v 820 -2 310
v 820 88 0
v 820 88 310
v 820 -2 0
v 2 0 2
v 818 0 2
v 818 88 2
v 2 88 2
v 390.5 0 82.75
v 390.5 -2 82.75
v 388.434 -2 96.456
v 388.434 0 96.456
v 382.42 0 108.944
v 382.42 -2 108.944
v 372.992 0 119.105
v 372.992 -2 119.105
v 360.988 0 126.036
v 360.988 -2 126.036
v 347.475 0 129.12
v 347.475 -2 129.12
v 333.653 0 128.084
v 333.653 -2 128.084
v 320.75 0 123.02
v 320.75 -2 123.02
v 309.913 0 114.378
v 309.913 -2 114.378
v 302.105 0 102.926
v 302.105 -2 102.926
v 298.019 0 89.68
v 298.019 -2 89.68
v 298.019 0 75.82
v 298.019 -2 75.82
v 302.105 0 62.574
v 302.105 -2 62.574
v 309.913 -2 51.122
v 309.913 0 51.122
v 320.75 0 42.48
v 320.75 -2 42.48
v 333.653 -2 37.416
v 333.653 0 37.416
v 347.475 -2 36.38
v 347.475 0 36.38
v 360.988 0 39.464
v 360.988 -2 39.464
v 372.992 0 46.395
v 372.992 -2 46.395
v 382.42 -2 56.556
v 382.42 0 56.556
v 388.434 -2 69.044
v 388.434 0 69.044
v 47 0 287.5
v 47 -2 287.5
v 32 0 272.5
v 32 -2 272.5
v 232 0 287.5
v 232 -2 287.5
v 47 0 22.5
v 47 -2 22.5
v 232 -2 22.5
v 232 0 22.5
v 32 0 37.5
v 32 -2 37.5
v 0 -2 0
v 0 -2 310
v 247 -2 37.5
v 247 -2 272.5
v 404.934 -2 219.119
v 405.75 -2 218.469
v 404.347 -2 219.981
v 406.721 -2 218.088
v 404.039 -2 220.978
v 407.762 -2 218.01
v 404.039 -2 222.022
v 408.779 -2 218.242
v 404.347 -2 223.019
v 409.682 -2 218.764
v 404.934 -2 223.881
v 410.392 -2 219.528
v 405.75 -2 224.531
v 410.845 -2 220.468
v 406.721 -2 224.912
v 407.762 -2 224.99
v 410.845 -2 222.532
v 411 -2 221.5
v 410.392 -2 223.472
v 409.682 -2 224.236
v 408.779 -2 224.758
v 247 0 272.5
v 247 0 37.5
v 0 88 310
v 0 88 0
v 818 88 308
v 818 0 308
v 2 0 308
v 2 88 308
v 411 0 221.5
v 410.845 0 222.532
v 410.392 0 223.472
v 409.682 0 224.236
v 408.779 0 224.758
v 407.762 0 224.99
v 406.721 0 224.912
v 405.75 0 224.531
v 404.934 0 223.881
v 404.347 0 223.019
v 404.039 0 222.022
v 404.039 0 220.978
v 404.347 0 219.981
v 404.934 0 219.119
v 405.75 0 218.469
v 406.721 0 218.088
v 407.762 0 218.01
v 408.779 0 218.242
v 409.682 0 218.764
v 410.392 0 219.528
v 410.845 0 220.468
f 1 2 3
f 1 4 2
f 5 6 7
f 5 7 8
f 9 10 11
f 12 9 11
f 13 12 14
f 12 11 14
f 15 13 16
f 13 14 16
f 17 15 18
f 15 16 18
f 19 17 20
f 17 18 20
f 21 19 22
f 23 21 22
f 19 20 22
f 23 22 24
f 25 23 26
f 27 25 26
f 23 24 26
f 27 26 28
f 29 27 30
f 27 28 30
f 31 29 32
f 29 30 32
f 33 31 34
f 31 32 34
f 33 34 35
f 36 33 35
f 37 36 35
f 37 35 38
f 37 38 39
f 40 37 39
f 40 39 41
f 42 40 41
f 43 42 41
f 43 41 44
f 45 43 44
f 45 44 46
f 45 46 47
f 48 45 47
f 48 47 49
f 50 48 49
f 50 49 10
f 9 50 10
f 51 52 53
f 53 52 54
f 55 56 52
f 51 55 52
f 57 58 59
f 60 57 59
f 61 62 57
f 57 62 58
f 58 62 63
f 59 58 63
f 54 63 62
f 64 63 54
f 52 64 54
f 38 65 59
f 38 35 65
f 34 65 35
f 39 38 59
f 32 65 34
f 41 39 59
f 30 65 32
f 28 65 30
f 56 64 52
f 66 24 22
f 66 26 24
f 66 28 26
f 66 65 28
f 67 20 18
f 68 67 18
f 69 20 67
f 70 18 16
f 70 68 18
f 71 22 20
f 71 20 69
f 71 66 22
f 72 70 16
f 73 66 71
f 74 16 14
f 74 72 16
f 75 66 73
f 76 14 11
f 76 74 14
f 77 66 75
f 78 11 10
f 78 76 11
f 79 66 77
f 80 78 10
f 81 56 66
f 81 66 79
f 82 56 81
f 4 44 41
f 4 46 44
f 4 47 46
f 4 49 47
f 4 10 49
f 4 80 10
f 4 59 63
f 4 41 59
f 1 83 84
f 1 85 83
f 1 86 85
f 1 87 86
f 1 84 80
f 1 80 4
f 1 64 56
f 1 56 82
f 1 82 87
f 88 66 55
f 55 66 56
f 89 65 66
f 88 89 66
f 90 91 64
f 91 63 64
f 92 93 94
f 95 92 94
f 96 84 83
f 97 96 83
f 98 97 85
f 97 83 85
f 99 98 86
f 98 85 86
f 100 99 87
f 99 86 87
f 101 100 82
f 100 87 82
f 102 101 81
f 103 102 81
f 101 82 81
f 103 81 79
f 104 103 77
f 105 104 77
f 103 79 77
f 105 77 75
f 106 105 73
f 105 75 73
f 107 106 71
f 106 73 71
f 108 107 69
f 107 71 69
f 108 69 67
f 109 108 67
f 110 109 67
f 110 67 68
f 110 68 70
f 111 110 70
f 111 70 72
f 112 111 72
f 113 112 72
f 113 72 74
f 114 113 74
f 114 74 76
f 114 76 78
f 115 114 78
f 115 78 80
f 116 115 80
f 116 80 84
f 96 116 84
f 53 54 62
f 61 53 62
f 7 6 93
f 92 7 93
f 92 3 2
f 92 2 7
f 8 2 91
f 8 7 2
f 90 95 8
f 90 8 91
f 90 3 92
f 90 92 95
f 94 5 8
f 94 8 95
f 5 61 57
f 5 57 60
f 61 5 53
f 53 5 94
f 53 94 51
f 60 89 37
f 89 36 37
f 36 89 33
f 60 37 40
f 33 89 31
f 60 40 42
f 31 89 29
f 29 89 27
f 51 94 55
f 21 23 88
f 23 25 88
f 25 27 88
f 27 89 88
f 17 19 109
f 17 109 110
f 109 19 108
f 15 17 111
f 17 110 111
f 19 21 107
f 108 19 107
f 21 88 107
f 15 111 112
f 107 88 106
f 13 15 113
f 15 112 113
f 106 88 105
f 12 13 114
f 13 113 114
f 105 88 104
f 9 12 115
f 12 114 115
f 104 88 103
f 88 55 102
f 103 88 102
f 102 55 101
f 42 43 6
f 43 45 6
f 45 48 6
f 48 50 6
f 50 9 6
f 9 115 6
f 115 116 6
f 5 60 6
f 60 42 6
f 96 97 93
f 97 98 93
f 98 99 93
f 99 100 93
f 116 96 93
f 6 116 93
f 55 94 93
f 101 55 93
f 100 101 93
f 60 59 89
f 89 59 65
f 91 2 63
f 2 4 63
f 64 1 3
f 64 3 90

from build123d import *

# Parameters (mm, degrees)
F0_W     = 820
F0_H     = 310
F1_DEPTH = 2
F2_W     = 820
F2_H     = 310
F2_W_2   = 816
F2_H_2   = 306
F3_DEPTH = 88
F5_R     = 46.5
F5_R_2   = 3.5
F6_DEPTH = 90.001


with BuildPart() as f1:
    # F0 (on Front) → F1 (new body)
    with BuildSketch(Plane.XZ):
        with Locations((410, 155)):
            Rectangle(F0_W, F0_H)
    extrude(amount=F1_DEPTH)

    # F2 (on face) → F3 (join)
    with BuildSketch(Plane(origin=(0, 0, 0), x_dir=(-1, 0, 0), z_dir=(0, 1, 0))):
        with Locations((-410, 155)):
            Rectangle(F2_W, F2_H)
        with Locations((-410, 155)):
            Rectangle(F2_W_2, F2_H_2, mode=Mode.SUBTRACT)
    extrude(amount=F3_DEPTH)

    # F5 (on face) → F6 (cut, through all)
    with BuildSketch(Plane.XZ.offset(2)):
        Polygon((47.000004, 287.499992), (32.000004, 272.499992), (32.000004, 37.499992), (47.000004, 22.499992), (232.000004, 22.499992), (247.000004, 37.499992), (247.000004, 272.499992), (232.000004, 287.499992), align=None)
        with Locations((344.000004, 82.749992)):
            Circle(F5_R)
        with Locations((407.500004, 221.499992)):
            Circle(F5_R_2)
    extrude(amount=-F6_DEPTH, mode=Mode.SUBTRACT)


solid = f1.part
